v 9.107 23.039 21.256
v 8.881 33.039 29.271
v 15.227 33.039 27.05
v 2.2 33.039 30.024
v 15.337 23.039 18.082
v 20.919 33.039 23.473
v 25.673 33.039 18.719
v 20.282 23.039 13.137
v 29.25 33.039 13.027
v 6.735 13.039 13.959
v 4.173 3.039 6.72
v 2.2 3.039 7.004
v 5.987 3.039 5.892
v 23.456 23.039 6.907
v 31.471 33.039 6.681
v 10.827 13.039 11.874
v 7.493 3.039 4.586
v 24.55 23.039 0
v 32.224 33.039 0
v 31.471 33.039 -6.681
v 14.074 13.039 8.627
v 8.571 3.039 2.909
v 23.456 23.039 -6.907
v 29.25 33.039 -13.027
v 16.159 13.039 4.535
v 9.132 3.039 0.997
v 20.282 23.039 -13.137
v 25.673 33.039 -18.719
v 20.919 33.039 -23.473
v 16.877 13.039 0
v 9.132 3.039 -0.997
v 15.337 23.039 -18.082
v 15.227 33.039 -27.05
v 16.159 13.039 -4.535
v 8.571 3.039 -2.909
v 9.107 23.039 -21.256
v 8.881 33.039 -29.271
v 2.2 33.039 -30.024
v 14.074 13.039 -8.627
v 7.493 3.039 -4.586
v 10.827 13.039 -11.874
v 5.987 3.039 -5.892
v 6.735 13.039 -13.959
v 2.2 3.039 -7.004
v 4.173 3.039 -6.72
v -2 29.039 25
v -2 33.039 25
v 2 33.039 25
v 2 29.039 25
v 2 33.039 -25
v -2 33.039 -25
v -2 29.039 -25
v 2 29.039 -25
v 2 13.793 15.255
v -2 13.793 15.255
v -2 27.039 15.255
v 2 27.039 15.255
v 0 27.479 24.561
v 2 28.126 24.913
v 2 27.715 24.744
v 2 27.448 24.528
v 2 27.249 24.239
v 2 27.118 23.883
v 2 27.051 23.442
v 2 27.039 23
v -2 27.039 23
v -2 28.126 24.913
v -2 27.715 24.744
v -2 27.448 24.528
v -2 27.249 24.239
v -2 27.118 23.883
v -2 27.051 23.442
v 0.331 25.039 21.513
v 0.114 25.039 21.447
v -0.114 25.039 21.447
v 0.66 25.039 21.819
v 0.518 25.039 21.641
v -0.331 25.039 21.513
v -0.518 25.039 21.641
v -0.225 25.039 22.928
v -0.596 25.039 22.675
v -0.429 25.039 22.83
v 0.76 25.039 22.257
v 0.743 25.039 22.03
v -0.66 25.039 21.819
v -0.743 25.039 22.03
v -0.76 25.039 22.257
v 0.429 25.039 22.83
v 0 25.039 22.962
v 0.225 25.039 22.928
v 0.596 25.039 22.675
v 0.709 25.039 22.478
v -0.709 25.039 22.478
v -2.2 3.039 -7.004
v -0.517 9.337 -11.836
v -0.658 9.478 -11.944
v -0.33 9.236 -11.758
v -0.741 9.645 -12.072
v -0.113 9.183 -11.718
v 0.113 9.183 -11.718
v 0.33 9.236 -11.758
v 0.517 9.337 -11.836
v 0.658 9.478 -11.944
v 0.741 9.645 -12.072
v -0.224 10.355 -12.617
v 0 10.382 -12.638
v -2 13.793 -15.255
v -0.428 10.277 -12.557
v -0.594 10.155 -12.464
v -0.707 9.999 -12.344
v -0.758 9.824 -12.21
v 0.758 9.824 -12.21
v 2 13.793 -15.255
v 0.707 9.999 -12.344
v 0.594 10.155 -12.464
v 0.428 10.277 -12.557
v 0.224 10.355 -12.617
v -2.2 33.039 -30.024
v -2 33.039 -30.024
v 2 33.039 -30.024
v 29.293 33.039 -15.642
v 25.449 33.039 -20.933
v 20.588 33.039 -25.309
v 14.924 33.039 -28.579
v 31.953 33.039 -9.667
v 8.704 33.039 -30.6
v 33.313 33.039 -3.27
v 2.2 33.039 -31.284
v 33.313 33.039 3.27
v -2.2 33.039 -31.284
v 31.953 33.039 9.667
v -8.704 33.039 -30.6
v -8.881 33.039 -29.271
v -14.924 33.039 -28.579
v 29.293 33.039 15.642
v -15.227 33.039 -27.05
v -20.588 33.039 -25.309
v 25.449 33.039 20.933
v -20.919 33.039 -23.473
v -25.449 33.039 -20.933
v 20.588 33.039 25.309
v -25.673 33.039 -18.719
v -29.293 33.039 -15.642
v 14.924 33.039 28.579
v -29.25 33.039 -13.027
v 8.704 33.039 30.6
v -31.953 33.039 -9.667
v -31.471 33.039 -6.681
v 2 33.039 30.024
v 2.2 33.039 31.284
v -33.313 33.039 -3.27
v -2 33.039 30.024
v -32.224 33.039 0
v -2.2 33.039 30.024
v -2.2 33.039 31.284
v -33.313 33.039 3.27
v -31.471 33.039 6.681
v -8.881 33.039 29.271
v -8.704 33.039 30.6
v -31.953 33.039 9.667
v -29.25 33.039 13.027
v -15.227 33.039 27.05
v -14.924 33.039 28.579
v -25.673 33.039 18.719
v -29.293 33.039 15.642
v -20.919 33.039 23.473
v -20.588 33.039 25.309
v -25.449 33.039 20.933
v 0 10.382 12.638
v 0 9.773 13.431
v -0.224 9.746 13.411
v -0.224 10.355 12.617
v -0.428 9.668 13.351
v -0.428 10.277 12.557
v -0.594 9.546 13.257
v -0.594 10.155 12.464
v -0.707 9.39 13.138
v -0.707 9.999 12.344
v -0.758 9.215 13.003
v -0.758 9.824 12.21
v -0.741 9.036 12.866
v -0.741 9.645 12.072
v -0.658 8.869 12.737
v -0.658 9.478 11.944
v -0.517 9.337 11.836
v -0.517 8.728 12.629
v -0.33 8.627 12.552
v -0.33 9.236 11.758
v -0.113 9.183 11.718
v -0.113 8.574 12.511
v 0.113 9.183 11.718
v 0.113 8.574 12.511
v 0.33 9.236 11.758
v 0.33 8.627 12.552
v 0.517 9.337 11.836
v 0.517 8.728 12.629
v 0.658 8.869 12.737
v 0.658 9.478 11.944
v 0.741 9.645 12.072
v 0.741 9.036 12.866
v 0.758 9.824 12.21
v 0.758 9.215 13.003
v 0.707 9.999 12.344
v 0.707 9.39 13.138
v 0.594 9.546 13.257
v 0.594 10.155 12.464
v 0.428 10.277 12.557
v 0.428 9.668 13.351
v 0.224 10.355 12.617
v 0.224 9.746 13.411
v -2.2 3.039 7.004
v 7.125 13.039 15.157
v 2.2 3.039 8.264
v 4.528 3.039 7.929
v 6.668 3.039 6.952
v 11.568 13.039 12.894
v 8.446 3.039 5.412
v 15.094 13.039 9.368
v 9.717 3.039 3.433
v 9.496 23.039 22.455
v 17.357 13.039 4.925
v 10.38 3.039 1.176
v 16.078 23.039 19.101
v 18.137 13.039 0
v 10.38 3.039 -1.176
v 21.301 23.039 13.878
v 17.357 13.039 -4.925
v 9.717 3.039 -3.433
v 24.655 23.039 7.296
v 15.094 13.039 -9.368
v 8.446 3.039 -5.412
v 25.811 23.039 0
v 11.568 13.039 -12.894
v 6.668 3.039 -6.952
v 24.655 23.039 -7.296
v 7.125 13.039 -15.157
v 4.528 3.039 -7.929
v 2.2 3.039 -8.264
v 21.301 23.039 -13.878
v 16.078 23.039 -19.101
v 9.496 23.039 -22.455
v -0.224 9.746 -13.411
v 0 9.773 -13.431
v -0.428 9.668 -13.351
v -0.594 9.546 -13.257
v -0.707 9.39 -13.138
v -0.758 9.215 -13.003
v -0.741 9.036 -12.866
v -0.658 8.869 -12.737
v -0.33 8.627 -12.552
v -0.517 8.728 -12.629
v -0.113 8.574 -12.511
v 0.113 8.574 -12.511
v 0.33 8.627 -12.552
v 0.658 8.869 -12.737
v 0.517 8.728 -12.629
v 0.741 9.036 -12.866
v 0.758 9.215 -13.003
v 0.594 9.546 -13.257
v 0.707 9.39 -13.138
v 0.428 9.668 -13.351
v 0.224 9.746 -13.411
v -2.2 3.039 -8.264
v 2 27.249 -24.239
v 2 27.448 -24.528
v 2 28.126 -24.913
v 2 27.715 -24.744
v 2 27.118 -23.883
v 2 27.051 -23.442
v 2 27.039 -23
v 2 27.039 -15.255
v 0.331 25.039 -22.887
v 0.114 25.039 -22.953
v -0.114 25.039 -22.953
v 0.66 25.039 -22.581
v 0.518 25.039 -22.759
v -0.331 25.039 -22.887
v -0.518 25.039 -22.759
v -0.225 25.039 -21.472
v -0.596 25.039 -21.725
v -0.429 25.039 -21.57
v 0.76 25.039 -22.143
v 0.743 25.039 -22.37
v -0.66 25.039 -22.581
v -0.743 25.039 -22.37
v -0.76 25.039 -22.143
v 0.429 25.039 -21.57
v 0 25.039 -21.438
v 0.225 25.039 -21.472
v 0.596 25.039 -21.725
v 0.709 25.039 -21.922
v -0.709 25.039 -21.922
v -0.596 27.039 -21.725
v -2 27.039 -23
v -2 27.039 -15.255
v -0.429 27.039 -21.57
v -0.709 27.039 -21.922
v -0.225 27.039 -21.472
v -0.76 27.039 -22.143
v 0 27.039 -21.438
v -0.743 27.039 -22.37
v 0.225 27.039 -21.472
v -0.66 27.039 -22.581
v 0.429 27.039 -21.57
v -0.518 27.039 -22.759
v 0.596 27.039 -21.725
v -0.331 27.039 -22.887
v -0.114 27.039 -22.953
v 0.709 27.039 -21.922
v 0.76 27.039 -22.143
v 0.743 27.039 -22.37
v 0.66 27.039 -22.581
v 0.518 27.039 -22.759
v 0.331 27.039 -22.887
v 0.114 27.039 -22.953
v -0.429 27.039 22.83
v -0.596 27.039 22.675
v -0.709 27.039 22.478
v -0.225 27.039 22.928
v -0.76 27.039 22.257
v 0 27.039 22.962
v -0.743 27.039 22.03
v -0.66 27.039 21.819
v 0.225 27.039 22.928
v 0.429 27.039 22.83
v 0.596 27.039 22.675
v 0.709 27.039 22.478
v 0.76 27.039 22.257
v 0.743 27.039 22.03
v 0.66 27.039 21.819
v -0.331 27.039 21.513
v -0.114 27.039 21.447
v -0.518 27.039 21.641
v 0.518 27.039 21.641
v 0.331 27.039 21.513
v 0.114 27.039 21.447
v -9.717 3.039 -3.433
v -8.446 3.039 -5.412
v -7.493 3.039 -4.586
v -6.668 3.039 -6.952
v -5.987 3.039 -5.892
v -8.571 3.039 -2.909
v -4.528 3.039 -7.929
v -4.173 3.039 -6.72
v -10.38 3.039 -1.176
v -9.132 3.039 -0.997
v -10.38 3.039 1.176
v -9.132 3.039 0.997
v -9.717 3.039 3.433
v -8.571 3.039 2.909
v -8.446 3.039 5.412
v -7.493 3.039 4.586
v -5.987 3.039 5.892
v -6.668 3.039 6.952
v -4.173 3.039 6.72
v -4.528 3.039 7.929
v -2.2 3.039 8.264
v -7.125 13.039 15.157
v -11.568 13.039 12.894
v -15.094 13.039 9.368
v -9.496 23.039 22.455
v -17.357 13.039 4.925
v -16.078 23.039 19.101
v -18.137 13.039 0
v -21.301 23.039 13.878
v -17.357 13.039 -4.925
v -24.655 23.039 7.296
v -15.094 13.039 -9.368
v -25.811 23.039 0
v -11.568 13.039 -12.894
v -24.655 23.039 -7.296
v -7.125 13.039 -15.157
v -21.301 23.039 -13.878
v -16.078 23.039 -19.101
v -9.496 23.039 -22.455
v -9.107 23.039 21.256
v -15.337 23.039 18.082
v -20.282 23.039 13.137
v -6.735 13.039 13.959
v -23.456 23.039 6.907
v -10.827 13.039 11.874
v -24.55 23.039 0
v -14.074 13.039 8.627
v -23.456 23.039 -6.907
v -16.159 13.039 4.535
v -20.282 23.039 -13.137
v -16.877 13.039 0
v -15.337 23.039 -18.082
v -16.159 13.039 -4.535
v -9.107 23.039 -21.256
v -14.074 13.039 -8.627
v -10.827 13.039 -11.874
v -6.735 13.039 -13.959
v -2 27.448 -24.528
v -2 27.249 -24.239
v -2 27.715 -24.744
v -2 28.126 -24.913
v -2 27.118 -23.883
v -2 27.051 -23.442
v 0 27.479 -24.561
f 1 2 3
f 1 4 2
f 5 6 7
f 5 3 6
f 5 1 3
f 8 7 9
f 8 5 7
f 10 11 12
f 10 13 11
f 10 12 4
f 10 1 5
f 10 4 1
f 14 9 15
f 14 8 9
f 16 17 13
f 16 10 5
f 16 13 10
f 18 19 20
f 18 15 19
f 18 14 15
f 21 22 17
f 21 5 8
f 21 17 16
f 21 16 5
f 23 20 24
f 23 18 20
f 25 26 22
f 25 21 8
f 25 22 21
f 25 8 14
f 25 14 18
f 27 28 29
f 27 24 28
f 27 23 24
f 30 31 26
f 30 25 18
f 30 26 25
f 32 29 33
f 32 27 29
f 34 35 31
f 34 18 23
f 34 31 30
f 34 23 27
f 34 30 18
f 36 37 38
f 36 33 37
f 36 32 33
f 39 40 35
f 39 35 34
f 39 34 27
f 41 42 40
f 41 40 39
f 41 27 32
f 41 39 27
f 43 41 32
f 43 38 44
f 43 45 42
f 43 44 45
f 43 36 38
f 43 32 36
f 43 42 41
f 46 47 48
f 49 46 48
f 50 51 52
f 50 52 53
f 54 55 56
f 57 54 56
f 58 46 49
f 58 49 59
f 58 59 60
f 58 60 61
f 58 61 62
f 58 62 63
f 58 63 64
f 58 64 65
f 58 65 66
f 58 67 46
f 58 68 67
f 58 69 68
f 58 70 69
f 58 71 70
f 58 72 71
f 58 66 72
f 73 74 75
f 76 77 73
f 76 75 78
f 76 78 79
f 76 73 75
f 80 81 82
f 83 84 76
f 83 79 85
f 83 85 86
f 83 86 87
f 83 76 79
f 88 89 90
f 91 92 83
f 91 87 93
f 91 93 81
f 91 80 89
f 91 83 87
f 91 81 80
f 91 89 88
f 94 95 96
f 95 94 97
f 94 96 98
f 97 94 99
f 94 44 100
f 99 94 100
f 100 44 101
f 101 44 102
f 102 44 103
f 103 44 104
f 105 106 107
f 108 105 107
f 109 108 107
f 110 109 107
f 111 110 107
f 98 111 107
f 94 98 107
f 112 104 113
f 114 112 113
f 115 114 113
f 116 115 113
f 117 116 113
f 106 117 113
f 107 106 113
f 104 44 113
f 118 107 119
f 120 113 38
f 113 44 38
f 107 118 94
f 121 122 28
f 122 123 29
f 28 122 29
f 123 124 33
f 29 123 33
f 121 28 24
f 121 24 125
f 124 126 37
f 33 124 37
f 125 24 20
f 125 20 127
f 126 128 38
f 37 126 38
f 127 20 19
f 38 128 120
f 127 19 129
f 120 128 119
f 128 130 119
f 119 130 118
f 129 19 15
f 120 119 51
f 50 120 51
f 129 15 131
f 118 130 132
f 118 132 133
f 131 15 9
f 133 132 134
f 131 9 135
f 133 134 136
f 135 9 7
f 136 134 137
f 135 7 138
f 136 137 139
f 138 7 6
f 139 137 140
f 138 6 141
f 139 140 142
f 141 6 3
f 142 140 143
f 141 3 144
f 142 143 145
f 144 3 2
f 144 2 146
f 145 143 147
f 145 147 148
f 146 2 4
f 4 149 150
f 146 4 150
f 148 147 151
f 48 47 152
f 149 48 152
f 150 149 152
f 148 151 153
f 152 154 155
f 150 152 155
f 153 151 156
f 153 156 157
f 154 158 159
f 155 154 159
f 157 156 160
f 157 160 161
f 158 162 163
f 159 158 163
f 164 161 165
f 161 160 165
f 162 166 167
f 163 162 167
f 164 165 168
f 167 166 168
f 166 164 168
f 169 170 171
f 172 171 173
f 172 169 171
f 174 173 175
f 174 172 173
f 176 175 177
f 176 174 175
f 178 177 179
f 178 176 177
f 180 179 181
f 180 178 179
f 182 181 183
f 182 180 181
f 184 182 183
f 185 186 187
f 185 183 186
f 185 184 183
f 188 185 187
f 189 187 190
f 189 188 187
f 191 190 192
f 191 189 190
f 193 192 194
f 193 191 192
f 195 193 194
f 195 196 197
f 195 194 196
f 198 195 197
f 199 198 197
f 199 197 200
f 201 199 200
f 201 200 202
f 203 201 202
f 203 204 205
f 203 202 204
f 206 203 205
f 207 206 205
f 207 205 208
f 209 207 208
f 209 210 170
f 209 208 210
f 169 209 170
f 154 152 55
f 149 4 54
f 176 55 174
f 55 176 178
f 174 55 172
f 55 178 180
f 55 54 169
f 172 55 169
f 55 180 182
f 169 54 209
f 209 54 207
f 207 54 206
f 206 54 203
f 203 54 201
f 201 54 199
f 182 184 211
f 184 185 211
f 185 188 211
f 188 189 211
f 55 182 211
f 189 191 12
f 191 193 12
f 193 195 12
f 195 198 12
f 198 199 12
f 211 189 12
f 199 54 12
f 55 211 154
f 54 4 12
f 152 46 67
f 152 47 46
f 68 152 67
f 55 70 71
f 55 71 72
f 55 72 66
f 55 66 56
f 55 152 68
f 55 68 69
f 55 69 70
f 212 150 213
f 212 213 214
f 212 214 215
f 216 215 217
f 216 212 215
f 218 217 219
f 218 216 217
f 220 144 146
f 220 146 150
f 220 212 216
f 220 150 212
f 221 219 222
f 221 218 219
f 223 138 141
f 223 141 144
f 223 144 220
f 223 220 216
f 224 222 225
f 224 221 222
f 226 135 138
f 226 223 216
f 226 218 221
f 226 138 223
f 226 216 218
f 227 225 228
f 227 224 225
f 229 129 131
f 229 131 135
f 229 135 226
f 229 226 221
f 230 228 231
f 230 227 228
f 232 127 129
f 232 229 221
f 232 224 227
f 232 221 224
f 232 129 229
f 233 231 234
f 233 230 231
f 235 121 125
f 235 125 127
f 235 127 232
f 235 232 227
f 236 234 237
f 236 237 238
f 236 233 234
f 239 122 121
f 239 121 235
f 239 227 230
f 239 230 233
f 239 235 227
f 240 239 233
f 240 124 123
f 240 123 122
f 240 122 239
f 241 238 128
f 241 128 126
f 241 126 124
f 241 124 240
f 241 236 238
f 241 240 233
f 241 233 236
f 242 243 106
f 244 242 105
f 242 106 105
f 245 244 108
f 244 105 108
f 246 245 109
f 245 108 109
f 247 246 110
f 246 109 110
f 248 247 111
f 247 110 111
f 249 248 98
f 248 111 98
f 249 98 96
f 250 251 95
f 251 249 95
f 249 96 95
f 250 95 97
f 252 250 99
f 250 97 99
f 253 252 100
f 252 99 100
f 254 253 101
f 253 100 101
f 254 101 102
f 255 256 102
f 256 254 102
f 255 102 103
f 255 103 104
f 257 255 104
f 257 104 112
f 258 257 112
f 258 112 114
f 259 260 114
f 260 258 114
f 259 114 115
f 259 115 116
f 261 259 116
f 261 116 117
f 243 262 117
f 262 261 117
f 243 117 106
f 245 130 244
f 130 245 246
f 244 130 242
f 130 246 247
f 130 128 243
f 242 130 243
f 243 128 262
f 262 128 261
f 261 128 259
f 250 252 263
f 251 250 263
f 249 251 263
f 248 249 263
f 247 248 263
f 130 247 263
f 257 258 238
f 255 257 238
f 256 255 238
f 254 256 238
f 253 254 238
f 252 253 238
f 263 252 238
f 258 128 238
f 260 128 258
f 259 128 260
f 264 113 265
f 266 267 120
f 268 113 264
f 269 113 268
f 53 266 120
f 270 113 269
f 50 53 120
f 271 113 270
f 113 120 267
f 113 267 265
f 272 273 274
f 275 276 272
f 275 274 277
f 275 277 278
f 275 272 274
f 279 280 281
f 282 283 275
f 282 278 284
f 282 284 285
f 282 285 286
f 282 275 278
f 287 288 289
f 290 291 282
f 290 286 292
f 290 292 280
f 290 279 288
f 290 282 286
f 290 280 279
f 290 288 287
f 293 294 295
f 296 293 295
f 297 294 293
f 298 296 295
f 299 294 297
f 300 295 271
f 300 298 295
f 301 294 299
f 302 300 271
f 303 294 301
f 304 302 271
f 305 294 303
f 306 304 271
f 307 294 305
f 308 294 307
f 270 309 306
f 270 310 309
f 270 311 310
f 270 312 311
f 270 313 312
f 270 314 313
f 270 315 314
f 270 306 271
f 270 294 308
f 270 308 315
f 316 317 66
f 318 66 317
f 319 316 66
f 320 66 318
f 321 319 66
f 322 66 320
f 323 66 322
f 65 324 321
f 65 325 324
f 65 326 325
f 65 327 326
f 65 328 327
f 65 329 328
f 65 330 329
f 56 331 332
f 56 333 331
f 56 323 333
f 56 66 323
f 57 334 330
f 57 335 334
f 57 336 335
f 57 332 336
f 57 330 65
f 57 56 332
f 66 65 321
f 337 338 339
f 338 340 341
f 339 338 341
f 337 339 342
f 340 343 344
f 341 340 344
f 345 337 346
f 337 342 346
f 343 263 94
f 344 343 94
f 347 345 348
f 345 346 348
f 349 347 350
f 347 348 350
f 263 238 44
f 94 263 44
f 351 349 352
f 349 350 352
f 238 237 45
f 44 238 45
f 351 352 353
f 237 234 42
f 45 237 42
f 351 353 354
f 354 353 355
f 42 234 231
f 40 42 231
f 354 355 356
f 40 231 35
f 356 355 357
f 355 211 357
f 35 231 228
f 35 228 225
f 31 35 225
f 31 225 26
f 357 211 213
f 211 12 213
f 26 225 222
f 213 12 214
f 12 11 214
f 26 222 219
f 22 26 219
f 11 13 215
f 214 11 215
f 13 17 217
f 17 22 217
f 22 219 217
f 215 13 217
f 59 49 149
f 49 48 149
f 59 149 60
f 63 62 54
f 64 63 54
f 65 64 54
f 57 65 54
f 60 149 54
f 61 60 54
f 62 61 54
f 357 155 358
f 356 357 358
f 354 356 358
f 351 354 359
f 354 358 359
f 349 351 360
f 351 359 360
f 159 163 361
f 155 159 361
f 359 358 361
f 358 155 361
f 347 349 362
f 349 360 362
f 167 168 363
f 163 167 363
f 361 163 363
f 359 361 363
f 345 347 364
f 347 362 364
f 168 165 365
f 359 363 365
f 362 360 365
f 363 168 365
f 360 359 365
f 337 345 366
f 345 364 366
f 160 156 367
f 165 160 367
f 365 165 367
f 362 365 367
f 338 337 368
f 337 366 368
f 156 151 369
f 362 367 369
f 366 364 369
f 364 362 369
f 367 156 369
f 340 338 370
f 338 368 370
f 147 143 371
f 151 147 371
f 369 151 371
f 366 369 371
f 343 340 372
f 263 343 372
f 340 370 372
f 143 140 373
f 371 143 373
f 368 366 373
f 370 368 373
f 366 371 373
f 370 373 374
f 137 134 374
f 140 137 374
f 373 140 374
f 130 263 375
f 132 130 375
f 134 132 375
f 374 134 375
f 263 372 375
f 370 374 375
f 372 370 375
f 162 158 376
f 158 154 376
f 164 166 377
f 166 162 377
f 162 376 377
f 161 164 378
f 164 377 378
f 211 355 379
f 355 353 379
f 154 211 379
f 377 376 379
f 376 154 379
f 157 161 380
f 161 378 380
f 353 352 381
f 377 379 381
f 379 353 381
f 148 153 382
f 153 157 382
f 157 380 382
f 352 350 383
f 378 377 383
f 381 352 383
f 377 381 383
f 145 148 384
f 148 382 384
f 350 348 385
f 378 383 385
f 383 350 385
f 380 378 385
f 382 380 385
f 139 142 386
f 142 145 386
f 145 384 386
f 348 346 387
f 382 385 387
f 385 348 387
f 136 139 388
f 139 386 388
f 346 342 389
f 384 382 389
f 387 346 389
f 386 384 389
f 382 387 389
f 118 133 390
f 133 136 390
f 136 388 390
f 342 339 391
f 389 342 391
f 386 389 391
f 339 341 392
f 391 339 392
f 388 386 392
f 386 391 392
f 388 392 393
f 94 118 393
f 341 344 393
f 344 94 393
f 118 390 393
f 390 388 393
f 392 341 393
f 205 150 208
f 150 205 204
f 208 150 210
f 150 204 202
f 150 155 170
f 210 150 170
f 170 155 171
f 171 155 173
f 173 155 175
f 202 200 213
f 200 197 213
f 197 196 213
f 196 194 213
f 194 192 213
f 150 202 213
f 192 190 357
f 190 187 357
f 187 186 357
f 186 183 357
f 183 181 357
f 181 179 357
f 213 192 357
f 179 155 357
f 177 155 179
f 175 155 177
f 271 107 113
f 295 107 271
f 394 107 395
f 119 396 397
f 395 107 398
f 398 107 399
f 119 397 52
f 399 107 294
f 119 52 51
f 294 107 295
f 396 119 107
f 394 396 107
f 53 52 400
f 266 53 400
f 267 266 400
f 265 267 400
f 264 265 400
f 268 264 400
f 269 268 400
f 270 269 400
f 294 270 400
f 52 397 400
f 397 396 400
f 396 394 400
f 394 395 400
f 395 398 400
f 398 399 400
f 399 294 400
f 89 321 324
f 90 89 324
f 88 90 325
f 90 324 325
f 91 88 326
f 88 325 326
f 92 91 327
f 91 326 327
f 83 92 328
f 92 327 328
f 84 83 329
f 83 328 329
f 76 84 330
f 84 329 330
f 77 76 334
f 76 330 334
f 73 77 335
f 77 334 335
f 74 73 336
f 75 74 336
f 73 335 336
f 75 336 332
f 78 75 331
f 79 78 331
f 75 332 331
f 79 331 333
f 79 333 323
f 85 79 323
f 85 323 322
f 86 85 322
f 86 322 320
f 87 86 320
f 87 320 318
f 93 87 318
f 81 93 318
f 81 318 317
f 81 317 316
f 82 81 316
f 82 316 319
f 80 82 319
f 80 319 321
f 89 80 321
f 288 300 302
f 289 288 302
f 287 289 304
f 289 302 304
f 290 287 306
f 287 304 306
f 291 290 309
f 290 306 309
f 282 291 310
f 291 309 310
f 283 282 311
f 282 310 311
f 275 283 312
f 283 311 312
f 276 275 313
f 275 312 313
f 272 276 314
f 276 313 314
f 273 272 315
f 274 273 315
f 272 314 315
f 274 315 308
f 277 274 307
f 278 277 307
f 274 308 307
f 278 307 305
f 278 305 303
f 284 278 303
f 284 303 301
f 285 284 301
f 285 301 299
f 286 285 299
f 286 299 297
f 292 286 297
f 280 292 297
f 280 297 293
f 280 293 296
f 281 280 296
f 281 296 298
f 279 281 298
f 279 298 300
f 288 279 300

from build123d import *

# Parameters (mm, degrees)
CONEREVOLVE_ANGLE                = 90
CONEREVOLVE_OTHER_WAY_ANGLE      = 90
CONE_EDGE_BOSS_EXTRUDE15_DEPTH   = 2.2
MOUNTING_HOLE_CUT_EXTRUDE6_REACH = 61.483
SKETCH90_R                       = 0.76
REINFORCINGSPAR_DEPTH            = 2
REINFORCINGSPAR_DEPTH_BACK       = 2
SKETCH94_W                       = 4
SKETCH94_H                       = 9.744950827
CUT_EXTRUDE1_DEPTH               = 6
FILLET2_SIZE                     = 2
SKETCH98_R                       = 0.762
CUT_EXTRUDE2_DEPTH               = 8


with BuildPart() as part:
    # Sketch88 → ConeRevolve (revolve)
    with BuildSketch(Plane(origin=(50.074313091, 0, 0), x_dir=(1, 0, 0), z_dir=(0, 0, 1))):
        Polygon((-82.2978509, 33.039348741), (-59.278041261, 3.039348741), (-60.538513675, 3.039348741), (-83.558323314, 33.039348741), align=None)
    revolve(axis=Axis((-2.2, -0.345734695, 0), (0, 1, 0)), revolution_arc=CONEREVOLVE_ANGLE)

    # Sketch88 → ConeRevolve other way (revolve)
    with BuildSketch(Plane(origin=(50.074313091, 0, 0), x_dir=(1, 0, 0), z_dir=(0, 0, 1))):
        Polygon((-82.2978509, 33.039348741), (-59.278041261, 3.039348741), (-60.538513675, 3.039348741), (-83.558323314, 33.039348741), align=None)
    revolve(axis=Axis((-2.2, -0.345734695, 0), (0, -1, 0)), revolution_arc=CONEREVOLVE_OTHER_WAY_ANGLE)

    # Sketch89 → Cone-Edge-Boss-Extrude15 (add)
    with BuildSketch(Plane(origin=(-2.2, 0, 0), x_dir=(0, 0, -1), z_dir=(1, 0, 0))):
        Polygon((-7.00372817, 3.039348741), (-8.264200584, 3.039348741), (-31.284010223, 33.039348741), (-30.023537809, 33.039348741), align=None)
        Polygon((8.264200584, 3.039348741), (7.00372817, 3.039348741), (30.023537809, 33.039348741), (31.284010223, 33.039348741), align=None)
    extrude(amount=CONE_EDGE_BOSS_EXTRUDE15_DEPTH)

    # Cone-Edge-Mirror: part across plane


with BuildPart() as part_1:
    add(part.part)
    add(part.part.mirror(Plane(origin=(0, 0, 0), x_dir=(0, 0, 1), z_dir=(1, 0, 0))))

    # Sketch90 → Mounting-Hole-Cut-Extrude6 (cut, up to next)
    with BuildSketch(Plane(origin=(0, -2.256187259, 2.940320481), x_dir=(1, 0, 0), z_dir=(2.7745173069220206e-15, -0.6087614290087164, 0.7933533402912384)), mode=Mode.PRIVATE) as mounting_hole_cut_extrude6_sk1:
        with Locations(Location((0, 15.169995435, 0), (0, 0, 90))):
            Circle(SKETCH90_R)
    mounting_hole_cut_extrude6_tool1 = extrude(mounting_hole_cut_extrude6_sk1.sketch, amount=MOUNTING_HOLE_CUT_EXTRUDE6_REACH, mode=Mode.PRIVATE) & part_1.part
    mounting_hole_cut_extrude6 = mounting_hole_cut_extrude6_tool1.solids().sort_by_distance((0, 9.778979, 12.175229))[0]
    add(mounting_hole_cut_extrude6, mode=Mode.SUBTRACT)

    # Mirror1: Mounting-Hole-Cut-Extrude6 across plane
    add(mounting_hole_cut_extrude6.mirror(Plane.XY), mode=Mode.SUBTRACT)

    # Sketch92 → ReinforcingSpar (add, two sides: drawn at the far end of the back side and taken through both)
    with BuildSketch(Plane(origin=(0, 0, 4.051072987), x_dir=(0, 0, -1), z_dir=(1, 0, 0)).offset(-REINFORCINGSPAR_DEPTH_BACK)):
        Polygon((-11.203976186, 33.039348741), (-27.232937236, 33.039348741), (-11.203976186, 12.15), align=None)
        Polygon((19.30612216, 33.039348741), (35.33508321, 33.039348741), (19.30612216, 12.15), align=None)
    extrude(amount=REINFORCINGSPAR_DEPTH + REINFORCINGSPAR_DEPTH_BACK)

    # Sketch94 → Cut-Extrude1 (cut)
    with BuildSketch(Plane(origin=(0, 33.039348741, 0), x_dir=(1, 0, 0), z_dir=(0, 1, 0))):
        with Locations((0, 20.127524587)):
            Rectangle(SKETCH94_W, SKETCH94_H)
        with Locations((0, -20.127524587)):
            Rectangle(SKETCH94_W, SKETCH94_H)
    extrude(amount=-CUT_EXTRUDE1_DEPTH, mode=Mode.SUBTRACT)

    # Fillet2
    # a fillet whose section is not a circle: 2 mm, written as the material it adds along each edge
    with BuildSketch(Plane(origin=(-2, 27.039348741, -25), x_dir=(0, 1, 0), z_dir=(1, 0, 0))) as fillet2_piece_1:
        with BuildLine():
            add(Edge.make_bspline([(FILLET2_SIZE, 0), (FILLET2_SIZE * 0.831801948466, 0), (FILLET2_SIZE * 0.663603896932, 0), (FILLET2_SIZE * 0.292893218813, FILLET2_SIZE * 0.0716919198361), (FILLET2_SIZE * 0.0716919198361, FILLET2_SIZE * 0.292893218813), (0, FILLET2_SIZE * 0.663603896932), (0, FILLET2_SIZE * 0.831801948466), (0, FILLET2_SIZE)], knots=[0, 0, 0, 0, 0, 0, 0.5, 0.5, 1, 1, 1, 1, 1, 1], degree=5))
            Line((0, FILLET2_SIZE), (-FILLET2_SIZE * 0.02, FILLET2_SIZE))
            Line((-FILLET2_SIZE * 0.02, FILLET2_SIZE), (-FILLET2_SIZE * 0.02, -FILLET2_SIZE * 0.02))
            Line((-FILLET2_SIZE * 0.02, -FILLET2_SIZE * 0.02), (FILLET2_SIZE, -FILLET2_SIZE * 0.02))
            Line((FILLET2_SIZE, -FILLET2_SIZE * 0.02), (FILLET2_SIZE, 0))
        make_face()
    extrude(amount=4)
    with BuildSketch(Plane(origin=(-2, 27.039348741, 25), x_dir=(0, 1, 0), z_dir=(1, 0, 0))) as fillet2_piece_2:
        with BuildLine():
            add(Edge.make_bspline([(FILLET2_SIZE, 0), (FILLET2_SIZE * 0.831801948466, 0), (FILLET2_SIZE * 0.663603896932, 0), (FILLET2_SIZE * 0.292893218813, -FILLET2_SIZE * 0.0716919198361), (FILLET2_SIZE * 0.0716919198361, -FILLET2_SIZE * 0.292893218813), (0, -FILLET2_SIZE * 0.663603896932), (0, -FILLET2_SIZE * 0.831801948466), (0, -FILLET2_SIZE)], knots=[0, 0, 0, 0, 0, 0, 0.5, 0.5, 1, 1, 1, 1, 1, 1], degree=5))
            Line((0, -FILLET2_SIZE), (-FILLET2_SIZE * 0.02, -FILLET2_SIZE))
            Line((-FILLET2_SIZE * 0.02, -FILLET2_SIZE), (-FILLET2_SIZE * 0.02, FILLET2_SIZE * 0.02))
            Line((-FILLET2_SIZE * 0.02, FILLET2_SIZE * 0.02), (FILLET2_SIZE, FILLET2_SIZE * 0.02))
            Line((FILLET2_SIZE, FILLET2_SIZE * 0.02), (FILLET2_SIZE, 0))
        make_face()
    extrude(amount=4)

    # Sketch98 → Cut-Extrude2 (cut)
    with BuildSketch(Plane(origin=(0, 33.039348741, 0), x_dir=(1, 0, 0), z_dir=(0, 1, 0))):
        with Locations(Location((0, -22.2, 0), (0, 0, 270))):
            Circle(SKETCH98_R)
        with Locations(Location((0, 22.2, 0), (0, 0, 270))):
            Circle(SKETCH98_R)
    extrude(amount=-CUT_EXTRUDE2_DEPTH, mode=Mode.SUBTRACT)


solid = part_1.part
